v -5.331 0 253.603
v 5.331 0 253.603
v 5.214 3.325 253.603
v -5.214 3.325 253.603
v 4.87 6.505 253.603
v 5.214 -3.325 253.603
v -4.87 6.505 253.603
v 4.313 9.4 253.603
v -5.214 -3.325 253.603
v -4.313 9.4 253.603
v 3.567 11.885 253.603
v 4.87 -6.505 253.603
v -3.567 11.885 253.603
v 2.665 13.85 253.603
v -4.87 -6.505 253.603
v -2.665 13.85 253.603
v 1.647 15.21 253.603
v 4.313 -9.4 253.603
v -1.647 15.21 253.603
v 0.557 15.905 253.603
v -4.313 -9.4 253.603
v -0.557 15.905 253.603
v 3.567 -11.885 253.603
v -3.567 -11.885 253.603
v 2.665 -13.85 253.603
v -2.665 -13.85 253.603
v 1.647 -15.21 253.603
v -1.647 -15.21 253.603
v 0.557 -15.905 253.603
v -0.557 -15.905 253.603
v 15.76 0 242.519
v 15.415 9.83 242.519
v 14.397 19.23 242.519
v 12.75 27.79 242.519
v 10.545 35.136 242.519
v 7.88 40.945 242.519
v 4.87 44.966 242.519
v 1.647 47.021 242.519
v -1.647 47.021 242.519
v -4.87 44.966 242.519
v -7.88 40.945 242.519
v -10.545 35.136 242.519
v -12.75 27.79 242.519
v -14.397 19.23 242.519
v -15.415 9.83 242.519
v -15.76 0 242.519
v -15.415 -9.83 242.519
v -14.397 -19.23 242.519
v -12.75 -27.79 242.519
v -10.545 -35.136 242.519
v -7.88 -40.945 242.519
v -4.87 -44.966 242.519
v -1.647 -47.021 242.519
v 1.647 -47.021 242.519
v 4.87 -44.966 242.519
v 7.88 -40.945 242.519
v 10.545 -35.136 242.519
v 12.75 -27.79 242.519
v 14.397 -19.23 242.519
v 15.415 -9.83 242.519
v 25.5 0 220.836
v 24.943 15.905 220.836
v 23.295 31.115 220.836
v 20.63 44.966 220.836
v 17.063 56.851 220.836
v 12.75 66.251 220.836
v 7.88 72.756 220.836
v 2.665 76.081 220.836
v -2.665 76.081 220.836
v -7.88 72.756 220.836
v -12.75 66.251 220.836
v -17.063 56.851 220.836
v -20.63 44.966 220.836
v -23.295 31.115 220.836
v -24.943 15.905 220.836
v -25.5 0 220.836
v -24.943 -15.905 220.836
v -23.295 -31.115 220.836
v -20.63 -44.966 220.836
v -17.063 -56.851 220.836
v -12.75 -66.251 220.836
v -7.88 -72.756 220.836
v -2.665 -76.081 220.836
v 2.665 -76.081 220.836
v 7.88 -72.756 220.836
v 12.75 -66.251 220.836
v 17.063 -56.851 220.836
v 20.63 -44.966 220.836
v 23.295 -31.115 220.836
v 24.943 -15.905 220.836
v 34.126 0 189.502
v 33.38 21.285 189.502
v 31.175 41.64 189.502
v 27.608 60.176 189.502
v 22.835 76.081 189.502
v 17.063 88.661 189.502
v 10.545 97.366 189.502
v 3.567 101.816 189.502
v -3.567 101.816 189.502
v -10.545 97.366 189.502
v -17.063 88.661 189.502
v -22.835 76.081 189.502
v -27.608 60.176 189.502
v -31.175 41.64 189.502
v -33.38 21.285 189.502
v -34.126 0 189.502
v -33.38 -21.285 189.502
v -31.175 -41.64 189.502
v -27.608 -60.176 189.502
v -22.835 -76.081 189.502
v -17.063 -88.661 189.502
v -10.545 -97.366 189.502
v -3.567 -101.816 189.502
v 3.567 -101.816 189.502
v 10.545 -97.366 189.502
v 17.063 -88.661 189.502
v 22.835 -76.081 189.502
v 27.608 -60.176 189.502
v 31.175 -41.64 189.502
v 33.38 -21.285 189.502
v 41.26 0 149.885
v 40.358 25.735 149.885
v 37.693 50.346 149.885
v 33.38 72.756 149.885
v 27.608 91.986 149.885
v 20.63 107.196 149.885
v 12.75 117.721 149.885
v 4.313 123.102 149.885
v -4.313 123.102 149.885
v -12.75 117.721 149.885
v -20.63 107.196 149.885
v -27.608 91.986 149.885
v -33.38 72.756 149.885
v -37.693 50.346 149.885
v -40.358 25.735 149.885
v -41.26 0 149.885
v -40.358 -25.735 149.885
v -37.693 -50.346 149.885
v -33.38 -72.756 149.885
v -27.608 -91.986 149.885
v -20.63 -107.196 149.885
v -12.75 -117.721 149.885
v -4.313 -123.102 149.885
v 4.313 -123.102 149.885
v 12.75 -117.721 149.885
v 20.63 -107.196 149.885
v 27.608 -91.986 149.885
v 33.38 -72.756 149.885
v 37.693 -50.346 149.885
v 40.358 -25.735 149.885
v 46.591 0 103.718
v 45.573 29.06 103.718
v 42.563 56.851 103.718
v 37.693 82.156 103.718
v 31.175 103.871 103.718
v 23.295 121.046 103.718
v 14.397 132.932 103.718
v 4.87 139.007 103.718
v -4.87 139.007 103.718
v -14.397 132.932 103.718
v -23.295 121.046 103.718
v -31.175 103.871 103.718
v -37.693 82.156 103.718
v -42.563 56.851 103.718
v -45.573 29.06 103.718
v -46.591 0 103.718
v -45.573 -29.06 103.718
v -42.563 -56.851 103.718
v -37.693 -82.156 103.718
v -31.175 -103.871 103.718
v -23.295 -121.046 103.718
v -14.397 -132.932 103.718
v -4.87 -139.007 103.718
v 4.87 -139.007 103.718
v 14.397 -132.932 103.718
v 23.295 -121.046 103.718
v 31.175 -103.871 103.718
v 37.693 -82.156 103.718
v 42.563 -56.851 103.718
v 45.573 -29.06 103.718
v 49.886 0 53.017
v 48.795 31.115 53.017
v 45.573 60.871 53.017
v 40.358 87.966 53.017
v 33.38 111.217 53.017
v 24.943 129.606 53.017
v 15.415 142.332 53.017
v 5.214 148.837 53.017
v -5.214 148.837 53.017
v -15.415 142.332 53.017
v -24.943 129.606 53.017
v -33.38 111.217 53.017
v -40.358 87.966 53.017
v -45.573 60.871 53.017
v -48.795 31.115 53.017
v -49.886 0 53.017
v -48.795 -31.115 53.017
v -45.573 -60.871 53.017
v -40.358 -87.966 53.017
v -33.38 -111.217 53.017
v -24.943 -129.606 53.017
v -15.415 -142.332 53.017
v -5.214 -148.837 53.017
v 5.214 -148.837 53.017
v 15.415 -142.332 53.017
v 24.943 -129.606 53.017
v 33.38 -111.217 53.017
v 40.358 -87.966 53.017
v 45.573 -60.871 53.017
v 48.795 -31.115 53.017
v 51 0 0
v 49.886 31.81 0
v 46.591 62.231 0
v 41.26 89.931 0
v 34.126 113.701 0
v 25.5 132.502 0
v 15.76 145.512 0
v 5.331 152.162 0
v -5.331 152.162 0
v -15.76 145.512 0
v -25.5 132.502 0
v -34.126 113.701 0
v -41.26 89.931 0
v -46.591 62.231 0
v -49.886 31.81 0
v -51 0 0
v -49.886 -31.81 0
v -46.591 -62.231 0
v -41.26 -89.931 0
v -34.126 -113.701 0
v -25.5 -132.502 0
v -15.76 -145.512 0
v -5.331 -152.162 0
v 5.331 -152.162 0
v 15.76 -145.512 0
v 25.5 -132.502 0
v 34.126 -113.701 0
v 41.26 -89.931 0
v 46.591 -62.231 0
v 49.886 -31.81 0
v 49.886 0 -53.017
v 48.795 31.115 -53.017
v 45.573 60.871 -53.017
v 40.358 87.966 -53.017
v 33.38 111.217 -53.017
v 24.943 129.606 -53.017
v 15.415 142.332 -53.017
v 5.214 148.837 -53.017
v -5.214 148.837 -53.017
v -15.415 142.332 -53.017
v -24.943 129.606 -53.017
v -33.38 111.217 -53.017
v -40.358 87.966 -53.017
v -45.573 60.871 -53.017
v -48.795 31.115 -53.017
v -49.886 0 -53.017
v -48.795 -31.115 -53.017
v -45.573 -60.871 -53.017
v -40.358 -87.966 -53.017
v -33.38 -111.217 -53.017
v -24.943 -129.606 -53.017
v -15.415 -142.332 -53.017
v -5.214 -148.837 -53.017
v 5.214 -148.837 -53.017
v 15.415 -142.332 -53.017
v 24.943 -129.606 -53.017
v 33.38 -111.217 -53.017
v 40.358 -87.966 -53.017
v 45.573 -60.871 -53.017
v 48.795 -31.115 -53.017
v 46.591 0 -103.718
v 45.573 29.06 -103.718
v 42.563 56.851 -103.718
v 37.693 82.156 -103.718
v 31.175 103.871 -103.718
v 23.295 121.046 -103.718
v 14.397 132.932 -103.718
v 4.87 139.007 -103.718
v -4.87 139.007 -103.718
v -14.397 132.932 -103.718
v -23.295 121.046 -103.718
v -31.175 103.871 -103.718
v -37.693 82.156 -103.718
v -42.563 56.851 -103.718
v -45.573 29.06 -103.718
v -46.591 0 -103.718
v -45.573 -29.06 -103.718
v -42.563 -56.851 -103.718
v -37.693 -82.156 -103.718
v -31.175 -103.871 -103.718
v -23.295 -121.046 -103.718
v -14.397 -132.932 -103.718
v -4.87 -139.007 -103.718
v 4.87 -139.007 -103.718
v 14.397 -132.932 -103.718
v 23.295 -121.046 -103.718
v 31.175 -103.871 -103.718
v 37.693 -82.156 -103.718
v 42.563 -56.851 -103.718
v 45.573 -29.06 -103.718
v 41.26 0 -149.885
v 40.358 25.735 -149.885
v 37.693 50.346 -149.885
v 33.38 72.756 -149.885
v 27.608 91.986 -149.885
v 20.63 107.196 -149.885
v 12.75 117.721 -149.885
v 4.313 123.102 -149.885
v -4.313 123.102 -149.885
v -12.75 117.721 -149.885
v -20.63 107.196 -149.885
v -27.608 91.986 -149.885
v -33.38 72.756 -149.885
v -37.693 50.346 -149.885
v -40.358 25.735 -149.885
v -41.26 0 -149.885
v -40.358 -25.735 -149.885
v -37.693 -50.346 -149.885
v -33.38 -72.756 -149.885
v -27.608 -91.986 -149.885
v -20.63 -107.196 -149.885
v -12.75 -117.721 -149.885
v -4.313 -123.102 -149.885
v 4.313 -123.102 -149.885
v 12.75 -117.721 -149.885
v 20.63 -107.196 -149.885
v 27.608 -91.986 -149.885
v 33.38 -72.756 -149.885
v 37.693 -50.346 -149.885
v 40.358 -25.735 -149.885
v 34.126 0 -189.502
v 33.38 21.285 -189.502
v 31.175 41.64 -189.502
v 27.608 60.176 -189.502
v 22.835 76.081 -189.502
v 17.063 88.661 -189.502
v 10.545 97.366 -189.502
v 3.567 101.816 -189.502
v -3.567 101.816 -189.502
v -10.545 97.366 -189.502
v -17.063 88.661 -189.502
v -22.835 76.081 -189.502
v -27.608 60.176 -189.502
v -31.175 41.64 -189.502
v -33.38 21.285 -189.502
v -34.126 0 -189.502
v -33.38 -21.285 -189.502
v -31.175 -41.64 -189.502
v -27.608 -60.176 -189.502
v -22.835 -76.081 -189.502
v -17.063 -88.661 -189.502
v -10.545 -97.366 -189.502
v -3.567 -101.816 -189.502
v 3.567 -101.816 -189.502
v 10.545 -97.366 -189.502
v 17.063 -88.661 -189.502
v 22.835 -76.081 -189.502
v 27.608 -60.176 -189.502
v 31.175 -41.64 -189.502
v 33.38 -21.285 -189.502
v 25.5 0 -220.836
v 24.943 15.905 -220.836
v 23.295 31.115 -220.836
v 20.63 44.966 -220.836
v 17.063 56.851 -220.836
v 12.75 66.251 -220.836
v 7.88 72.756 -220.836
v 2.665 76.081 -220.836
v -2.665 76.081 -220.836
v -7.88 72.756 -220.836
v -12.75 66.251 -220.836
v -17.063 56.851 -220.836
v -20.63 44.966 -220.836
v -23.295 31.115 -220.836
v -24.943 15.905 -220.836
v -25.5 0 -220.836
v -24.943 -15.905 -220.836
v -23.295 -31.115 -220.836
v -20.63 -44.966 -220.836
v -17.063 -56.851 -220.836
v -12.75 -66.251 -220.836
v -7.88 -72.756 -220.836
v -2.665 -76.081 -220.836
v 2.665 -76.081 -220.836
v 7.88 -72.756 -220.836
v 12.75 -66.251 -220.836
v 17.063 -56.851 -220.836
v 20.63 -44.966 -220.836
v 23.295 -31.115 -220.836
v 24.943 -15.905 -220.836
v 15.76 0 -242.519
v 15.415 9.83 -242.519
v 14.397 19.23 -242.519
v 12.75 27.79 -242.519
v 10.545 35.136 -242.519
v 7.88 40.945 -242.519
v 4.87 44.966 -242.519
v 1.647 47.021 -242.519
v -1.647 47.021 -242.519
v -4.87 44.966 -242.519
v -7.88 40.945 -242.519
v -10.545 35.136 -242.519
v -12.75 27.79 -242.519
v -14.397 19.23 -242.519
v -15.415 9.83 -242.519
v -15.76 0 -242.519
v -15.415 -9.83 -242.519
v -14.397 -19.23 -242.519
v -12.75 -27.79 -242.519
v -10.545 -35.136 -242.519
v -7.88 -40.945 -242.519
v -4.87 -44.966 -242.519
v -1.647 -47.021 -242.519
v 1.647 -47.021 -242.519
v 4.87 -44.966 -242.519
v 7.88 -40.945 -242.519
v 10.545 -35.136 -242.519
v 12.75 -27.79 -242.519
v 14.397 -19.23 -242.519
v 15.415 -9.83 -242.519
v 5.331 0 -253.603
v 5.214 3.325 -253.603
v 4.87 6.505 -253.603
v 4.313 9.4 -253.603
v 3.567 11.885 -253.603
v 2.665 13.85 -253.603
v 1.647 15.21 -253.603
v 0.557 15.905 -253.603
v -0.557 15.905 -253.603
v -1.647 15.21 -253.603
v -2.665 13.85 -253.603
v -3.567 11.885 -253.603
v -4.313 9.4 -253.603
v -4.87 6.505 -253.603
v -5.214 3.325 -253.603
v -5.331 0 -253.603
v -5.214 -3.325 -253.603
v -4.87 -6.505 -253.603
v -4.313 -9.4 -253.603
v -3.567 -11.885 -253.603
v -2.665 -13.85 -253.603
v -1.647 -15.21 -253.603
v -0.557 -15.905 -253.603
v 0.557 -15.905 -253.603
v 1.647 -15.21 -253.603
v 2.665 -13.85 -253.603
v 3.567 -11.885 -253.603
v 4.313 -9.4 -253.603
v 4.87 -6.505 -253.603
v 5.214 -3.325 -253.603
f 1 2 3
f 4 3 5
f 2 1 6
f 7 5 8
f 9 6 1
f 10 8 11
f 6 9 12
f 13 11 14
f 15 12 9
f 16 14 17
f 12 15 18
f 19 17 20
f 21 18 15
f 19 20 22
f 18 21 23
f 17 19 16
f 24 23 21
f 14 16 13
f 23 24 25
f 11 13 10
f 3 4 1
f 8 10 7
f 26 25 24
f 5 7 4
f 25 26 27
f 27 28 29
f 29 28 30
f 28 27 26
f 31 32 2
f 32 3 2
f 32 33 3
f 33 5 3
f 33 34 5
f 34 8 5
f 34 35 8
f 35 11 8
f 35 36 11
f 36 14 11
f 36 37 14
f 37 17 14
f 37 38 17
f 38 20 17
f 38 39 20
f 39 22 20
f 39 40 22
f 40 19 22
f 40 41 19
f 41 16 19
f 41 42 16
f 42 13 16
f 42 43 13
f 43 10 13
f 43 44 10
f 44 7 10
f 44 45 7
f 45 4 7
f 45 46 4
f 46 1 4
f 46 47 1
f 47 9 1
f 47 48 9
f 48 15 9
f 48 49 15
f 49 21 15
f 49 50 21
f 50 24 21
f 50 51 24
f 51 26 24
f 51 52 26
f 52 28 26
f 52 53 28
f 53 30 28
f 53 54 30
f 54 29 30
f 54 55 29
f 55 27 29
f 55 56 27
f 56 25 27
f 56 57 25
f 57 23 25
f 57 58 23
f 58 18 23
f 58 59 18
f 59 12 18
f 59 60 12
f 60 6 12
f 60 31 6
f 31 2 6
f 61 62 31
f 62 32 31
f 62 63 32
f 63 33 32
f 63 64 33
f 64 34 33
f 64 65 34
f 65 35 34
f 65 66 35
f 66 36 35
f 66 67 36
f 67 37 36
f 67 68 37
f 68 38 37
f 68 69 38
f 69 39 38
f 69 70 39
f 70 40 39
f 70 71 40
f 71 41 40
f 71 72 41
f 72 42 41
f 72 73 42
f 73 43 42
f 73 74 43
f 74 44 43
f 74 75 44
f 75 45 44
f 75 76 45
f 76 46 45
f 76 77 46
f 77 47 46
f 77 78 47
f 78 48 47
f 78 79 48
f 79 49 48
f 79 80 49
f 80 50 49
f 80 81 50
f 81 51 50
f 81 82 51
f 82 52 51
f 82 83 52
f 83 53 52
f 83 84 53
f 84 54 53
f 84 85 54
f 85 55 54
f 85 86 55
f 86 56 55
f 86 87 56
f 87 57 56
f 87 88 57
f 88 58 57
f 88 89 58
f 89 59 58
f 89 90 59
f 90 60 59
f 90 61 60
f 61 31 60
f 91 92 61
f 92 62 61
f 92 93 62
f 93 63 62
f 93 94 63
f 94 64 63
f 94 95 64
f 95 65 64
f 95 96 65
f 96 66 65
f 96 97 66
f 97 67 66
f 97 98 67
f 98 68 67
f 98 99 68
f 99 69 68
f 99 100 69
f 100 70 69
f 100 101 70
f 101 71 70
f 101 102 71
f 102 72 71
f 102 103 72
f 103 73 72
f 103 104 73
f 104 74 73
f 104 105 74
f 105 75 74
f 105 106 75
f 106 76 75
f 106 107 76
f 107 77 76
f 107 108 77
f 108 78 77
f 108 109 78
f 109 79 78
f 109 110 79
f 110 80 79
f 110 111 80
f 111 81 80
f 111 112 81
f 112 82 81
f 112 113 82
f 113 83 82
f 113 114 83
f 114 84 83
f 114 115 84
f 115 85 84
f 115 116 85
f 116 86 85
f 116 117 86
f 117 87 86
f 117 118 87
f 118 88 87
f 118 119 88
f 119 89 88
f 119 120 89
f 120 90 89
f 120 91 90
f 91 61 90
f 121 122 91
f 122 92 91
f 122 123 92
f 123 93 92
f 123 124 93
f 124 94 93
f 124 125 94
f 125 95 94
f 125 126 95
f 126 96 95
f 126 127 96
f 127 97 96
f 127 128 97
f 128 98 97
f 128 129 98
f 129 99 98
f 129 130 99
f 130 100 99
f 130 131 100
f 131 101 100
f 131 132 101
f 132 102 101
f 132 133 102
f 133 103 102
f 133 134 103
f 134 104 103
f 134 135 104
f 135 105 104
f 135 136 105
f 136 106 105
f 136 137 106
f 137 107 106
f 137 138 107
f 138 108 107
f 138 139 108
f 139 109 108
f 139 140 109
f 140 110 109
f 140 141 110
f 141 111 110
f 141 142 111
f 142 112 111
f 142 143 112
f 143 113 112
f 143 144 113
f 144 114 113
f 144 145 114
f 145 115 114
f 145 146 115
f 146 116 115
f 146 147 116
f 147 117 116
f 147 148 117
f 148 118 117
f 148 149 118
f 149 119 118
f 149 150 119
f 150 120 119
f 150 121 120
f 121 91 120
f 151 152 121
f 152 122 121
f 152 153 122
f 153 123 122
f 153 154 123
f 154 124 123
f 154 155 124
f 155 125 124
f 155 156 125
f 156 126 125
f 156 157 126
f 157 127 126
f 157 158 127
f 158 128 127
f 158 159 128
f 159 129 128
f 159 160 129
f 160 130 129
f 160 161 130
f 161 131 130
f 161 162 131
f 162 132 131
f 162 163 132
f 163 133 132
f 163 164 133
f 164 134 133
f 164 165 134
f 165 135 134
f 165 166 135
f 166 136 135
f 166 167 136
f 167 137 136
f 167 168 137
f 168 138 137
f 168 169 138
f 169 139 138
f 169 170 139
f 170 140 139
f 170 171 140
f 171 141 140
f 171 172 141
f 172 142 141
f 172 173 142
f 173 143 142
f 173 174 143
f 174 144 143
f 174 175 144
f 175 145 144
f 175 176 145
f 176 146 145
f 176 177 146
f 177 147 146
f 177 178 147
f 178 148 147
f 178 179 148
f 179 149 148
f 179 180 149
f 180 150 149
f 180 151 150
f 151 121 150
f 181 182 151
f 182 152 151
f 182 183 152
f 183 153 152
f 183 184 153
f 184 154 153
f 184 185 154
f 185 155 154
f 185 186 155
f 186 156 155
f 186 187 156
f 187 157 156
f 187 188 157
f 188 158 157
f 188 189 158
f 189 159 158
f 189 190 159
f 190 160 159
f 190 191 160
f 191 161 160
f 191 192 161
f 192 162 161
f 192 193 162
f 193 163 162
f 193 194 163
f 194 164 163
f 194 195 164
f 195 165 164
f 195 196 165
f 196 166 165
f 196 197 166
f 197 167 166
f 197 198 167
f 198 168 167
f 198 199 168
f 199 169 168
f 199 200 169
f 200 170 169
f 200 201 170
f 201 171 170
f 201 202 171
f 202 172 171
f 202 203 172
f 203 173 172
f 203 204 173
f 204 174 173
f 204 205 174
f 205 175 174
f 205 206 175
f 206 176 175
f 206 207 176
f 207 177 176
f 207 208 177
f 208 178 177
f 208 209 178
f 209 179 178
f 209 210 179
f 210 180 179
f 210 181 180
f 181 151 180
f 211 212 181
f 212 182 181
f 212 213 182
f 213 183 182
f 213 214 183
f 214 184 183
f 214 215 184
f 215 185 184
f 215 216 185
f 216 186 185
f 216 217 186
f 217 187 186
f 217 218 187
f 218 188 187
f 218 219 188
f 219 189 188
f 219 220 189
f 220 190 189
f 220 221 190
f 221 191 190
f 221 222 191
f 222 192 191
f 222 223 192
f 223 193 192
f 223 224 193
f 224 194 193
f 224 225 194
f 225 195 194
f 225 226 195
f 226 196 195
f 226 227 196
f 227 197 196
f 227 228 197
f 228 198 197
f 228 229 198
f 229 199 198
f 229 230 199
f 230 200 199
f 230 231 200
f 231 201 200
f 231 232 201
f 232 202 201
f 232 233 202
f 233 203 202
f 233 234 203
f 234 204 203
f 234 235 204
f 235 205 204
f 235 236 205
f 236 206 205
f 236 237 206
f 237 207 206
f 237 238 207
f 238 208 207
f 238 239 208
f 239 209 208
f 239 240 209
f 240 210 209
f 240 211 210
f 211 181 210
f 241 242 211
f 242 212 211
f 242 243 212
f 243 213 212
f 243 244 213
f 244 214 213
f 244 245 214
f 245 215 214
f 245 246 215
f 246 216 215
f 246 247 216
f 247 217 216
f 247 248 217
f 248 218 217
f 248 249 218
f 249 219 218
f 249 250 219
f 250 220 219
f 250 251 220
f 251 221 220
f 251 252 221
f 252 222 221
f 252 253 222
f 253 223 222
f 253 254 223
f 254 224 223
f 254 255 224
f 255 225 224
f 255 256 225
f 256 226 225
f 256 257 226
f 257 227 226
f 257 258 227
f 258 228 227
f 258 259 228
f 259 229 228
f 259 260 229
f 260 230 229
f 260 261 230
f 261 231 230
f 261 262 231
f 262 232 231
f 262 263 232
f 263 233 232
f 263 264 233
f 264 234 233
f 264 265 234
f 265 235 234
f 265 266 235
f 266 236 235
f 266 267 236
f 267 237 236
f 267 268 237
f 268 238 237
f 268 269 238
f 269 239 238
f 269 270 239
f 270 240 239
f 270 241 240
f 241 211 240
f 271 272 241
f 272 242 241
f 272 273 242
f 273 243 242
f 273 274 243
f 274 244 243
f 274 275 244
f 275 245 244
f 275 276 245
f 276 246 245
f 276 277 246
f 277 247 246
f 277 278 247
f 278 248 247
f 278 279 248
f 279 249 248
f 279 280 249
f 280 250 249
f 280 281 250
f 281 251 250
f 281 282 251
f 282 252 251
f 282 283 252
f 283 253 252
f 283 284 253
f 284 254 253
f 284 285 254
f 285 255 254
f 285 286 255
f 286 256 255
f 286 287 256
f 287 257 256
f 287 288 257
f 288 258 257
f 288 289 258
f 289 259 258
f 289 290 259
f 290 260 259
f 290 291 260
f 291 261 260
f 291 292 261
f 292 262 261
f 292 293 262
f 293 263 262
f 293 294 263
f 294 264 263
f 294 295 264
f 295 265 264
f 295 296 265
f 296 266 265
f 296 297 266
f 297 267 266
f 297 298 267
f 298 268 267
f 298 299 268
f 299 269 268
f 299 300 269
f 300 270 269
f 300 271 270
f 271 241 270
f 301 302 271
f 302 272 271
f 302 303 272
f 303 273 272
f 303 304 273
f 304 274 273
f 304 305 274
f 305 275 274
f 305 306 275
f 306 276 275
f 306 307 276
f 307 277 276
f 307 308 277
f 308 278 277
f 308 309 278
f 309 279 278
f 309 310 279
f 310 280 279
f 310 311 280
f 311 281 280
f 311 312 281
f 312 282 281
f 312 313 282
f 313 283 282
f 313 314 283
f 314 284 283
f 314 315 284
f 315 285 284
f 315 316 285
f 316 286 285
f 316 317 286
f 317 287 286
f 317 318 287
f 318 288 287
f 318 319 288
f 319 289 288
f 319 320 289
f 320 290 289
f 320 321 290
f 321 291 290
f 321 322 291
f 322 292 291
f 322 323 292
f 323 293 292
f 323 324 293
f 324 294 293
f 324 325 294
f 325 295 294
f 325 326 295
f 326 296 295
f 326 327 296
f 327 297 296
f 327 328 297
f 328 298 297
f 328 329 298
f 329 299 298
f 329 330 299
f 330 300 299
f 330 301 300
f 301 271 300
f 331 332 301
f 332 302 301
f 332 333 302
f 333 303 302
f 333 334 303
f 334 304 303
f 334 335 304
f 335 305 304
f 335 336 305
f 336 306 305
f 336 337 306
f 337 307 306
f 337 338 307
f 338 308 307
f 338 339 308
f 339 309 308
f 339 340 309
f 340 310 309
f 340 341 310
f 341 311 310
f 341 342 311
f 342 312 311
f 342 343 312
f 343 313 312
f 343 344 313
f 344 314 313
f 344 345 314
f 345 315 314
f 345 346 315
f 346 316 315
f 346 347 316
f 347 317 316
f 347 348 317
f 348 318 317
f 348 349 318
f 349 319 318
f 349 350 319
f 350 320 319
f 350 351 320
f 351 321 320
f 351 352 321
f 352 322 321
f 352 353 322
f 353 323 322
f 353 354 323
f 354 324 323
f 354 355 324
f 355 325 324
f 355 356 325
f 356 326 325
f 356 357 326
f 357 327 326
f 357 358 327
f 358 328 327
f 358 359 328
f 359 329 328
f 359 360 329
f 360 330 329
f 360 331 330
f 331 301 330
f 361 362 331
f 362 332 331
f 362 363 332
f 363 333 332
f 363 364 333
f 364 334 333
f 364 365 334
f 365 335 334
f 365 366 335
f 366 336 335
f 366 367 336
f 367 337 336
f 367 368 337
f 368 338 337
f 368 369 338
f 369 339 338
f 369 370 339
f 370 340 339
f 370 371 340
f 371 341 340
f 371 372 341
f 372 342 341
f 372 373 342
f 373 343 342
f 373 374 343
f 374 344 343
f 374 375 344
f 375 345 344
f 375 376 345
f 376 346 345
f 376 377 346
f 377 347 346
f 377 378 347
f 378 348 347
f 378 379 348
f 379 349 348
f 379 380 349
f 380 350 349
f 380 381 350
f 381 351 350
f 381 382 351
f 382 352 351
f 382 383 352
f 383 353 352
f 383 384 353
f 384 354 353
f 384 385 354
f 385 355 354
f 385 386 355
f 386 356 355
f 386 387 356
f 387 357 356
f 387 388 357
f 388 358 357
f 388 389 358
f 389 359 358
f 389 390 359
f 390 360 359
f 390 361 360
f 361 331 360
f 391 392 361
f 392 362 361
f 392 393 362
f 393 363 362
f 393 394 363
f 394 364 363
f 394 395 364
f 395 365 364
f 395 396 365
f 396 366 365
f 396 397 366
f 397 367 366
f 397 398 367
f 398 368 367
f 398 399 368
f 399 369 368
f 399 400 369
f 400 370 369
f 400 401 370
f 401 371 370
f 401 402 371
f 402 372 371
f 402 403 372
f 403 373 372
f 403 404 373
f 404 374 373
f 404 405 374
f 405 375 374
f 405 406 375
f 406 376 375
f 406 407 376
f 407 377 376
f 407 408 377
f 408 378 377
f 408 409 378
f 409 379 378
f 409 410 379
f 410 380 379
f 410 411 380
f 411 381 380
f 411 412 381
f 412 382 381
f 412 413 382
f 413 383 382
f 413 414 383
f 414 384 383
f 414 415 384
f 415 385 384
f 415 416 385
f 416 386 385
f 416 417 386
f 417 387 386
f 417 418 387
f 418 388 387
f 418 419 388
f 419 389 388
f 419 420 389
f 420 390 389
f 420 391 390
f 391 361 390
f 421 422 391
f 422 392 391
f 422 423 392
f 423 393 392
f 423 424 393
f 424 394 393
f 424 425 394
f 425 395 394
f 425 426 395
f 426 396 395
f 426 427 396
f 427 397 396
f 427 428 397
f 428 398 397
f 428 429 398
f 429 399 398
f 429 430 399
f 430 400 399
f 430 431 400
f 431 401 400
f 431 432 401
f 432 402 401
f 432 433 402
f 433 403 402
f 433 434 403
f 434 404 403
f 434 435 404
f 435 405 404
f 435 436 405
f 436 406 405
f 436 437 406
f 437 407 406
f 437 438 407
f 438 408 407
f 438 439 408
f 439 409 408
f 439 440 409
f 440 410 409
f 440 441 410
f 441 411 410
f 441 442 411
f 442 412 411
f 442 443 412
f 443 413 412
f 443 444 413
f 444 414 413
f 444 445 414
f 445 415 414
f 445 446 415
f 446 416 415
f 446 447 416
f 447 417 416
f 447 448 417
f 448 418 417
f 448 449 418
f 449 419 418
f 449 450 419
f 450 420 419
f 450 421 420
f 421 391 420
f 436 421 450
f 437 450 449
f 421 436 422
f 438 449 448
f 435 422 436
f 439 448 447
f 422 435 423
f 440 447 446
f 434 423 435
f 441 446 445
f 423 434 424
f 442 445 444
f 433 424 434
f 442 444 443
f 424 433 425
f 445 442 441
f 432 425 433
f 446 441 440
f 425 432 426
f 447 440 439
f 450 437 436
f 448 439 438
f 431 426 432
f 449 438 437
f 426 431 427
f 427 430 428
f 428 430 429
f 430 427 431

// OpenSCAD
// Generated by SolidPython 1.0.1 on 2020-07-29 00:39:25


scale(v = [3, 9, 15]) {
	sphere(r = 17);
}
/***********************************************
*********      SolidPython code:      **********
************************************************
 
# import packages: SolidPython
from solid import *
from solid.utils import *
from itertools import chain, combinations


class Resize:

    def __init__(self, scad_file):
        self.scad_file = scad_file
        #self.scad_file = import_scad(scad_file)
        # cone/cylinder param:
        self.r1 = 0
        self.r2 = 0
        self.h = 0
        # rectangular prism param:
        self.w = 0
        self.l = 0
        # ellipse param:
        self.r = 0

    # import OpenScad code (file name corresponds to shape)


    # classify shape + parameters
    def assign(self, param1, param2, param3):
        if self.scad_file == 'cone.scad':
            self.r1 = param1
            self.r2 = param2
            self.h = param3
        elif self.scad_file == 'cylinder.scad':
            self.r1 = param1
            self.r2 = param2
            self.h = param3
        elif self.scad_file == 'rectangularPrism.scad':
            self.h = param1
            self.l = param2
            self.w = param3
        else:
            self.r = param1
            self.h = param2

    # resize parameters
    def iterate(self):
        x = range(3, 20, 2)
        i = 1
        if self.scad_file == 'cone.scad':
            tempList = list(combinations(x, 2))
            for temp in tempList:
                param1 = temp[0]
                param2 = temp[1]
                filepath = 'produced_scad_files/' + 'cone' + str(param1) + '_' + str(param2) + '_' + '.scad'
                scad_render_to_file(cylinder(h=param1, r1=param2, r2=0), filepath)

        elif self.scad_file == 'cylinder.scad':
            tempList = list(combinations(x, 3))
            for temp in tempList:
                param1 = temp[0]
                param2 = temp[1]
                filepath = 'produced_scad_files/' + 'cylinder' + str(param1) + '_' + str(param2) + '_' + '.scad'
                scad_render_to_file(cylinder(h=param1, r1=param2, r2=param2), filepath)

        elif self.scad_file == 'rectangularPrism.scad':
            tempList = list(combinations(x, 3))
            for temp in tempList:
                param1 = temp[0]
                param2 = temp[1]
                param3 = temp[2]
                filepath = 'produced_scad_files/' + 'rectangularPrism' + str(param1) + '_' + str(param2) + '_' + str(
                    param3) + '.scad'
                scad_render_to_file(cube(size=(param1, param2, param3)), filepath)

        elif self.scad_file == 'ellipse.scad':
            tempList = list(combinations(x, 4))
            for temp in tempList:
                param1 = temp[0]
                param2 = temp[1]
                param3 = temp[2]
                param4 = temp[3]
                filepath = 'produced_scad_files/' + 'ellipse' + str(param1) + '_' + str(param2) + '_' + str(param3) + '_' + str(param4) + '.scad'
                scad_render_to_file(scale([param1, param2, param3])(sphere(r=param4)), filepath)

    def render_to_scadfile(self):
        scad_render_to_file(scad, 'example.scad') 
 
************************************************/
